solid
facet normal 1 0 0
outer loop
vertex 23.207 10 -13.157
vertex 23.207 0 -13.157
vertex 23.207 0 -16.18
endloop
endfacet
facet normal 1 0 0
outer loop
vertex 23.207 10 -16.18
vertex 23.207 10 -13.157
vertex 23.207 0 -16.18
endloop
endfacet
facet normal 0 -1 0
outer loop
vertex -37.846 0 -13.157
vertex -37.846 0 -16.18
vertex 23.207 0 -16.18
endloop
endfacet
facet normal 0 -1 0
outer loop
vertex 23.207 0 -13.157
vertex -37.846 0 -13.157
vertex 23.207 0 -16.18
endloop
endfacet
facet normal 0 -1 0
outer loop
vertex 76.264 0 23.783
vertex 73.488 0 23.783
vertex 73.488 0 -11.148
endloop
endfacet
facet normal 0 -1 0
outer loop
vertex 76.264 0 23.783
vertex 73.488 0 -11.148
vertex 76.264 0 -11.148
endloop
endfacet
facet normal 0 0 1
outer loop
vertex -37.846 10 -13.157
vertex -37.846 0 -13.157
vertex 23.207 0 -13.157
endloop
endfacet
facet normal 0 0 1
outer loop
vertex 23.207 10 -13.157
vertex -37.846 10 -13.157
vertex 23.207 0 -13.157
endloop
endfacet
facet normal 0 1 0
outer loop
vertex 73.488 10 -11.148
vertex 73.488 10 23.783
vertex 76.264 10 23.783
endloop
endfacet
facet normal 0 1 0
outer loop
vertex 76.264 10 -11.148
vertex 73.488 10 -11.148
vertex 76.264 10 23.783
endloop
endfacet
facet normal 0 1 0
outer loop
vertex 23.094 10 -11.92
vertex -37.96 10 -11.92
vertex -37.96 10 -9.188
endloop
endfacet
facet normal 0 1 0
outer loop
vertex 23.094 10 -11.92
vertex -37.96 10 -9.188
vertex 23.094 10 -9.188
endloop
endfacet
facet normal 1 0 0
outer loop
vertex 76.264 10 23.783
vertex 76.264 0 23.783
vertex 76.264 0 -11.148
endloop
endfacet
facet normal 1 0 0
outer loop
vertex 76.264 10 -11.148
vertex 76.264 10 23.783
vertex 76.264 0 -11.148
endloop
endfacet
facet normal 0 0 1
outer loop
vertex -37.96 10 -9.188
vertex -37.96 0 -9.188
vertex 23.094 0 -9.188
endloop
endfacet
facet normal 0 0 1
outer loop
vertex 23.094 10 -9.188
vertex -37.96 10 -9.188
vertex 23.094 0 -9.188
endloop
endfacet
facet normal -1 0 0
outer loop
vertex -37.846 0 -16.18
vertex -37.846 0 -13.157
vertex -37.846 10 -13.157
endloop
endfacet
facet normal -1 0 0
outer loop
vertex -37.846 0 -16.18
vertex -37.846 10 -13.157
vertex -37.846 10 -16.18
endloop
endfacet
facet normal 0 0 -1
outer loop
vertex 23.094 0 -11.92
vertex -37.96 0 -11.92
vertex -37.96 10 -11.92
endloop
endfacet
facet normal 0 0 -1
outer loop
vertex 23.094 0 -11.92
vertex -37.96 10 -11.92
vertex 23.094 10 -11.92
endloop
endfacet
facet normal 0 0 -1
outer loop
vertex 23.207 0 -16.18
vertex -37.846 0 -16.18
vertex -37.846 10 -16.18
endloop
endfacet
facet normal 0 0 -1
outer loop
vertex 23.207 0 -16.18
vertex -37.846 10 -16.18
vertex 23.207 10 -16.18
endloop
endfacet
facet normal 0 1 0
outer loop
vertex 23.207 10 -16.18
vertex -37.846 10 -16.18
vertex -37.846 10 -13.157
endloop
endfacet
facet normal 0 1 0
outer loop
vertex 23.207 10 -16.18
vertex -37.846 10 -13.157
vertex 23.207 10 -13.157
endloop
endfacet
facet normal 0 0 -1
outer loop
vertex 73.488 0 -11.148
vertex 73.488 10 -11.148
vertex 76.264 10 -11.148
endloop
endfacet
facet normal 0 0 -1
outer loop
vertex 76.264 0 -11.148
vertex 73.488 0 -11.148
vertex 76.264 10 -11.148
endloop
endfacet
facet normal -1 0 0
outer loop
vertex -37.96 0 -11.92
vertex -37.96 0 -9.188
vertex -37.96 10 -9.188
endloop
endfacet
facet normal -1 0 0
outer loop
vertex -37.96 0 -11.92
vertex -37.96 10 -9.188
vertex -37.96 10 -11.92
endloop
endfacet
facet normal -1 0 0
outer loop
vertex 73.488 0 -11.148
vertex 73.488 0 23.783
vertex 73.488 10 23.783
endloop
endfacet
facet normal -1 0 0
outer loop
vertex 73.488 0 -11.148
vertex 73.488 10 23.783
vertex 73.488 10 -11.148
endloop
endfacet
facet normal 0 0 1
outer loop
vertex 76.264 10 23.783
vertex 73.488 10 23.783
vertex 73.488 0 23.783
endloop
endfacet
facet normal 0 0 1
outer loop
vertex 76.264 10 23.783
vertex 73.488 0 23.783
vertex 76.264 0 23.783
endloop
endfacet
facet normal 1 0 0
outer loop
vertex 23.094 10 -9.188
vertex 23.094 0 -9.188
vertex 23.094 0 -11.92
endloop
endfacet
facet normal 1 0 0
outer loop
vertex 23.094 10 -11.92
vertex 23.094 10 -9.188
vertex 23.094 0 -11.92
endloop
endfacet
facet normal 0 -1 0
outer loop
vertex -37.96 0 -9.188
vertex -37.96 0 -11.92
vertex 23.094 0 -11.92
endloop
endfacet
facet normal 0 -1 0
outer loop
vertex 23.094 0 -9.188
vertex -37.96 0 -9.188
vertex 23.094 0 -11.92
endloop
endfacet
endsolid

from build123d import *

# Parameters (mm, degrees)
SKETCH1_W             = 61.053444607
SKETCH1_H             = 3.022447753
BOSS_EXTRUDE1_DEPTH   = 10
SKETCH1_W_2           = 61.053444606
SKETCH1_H_2           = 2.731728324
BOSS_EXTRUDE1_2_DEPTH = 10
SKETCH1_W_3           = 2.776893353
SKETCH1_H_3           = 34.930395329
BOSS_EXTRUDE1_3_DEPTH = 10


with BuildPart() as part:
    # Sketch1 → Boss-Extrude1 (new body)
    with BuildSketch(Plane(origin=(0, 0, 0), x_dir=(1, 0, 0), z_dir=(0, 1, 0))):
        with Locations((-7.319475954, 14.668631102)):
            Rectangle(SKETCH1_W, SKETCH1_H)
    extrude(amount=BOSS_EXTRUDE1_DEPTH)


with BuildPart() as body_2:
    # Sketch1 → Boss-Extrude1 2 (new body)
    with BuildSketch(Plane(origin=(0, 0, 0), x_dir=(1, 0, 0), z_dir=(0, 1, 0))):
        with Locations((-7.433205843, 10.553839763)):
            Rectangle(SKETCH1_W_2, SKETCH1_H_2)
    extrude(amount=BOSS_EXTRUDE1_2_DEPTH)


with BuildPart() as body_3:
    # Sketch1 → Boss-Extrude1 3 (new body)
    with BuildSketch(Plane(origin=(0, 0, 0), x_dir=(1, 0, 0), z_dir=(0, 1, 0))):
        with Locations((74.876018125, -6.317453736)):
            Rectangle(SKETCH1_W_3, SKETCH1_H_3)
    extrude(amount=BOSS_EXTRUDE1_3_DEPTH)


solid = Compound([part.part, body_2.part, body_3.part])
